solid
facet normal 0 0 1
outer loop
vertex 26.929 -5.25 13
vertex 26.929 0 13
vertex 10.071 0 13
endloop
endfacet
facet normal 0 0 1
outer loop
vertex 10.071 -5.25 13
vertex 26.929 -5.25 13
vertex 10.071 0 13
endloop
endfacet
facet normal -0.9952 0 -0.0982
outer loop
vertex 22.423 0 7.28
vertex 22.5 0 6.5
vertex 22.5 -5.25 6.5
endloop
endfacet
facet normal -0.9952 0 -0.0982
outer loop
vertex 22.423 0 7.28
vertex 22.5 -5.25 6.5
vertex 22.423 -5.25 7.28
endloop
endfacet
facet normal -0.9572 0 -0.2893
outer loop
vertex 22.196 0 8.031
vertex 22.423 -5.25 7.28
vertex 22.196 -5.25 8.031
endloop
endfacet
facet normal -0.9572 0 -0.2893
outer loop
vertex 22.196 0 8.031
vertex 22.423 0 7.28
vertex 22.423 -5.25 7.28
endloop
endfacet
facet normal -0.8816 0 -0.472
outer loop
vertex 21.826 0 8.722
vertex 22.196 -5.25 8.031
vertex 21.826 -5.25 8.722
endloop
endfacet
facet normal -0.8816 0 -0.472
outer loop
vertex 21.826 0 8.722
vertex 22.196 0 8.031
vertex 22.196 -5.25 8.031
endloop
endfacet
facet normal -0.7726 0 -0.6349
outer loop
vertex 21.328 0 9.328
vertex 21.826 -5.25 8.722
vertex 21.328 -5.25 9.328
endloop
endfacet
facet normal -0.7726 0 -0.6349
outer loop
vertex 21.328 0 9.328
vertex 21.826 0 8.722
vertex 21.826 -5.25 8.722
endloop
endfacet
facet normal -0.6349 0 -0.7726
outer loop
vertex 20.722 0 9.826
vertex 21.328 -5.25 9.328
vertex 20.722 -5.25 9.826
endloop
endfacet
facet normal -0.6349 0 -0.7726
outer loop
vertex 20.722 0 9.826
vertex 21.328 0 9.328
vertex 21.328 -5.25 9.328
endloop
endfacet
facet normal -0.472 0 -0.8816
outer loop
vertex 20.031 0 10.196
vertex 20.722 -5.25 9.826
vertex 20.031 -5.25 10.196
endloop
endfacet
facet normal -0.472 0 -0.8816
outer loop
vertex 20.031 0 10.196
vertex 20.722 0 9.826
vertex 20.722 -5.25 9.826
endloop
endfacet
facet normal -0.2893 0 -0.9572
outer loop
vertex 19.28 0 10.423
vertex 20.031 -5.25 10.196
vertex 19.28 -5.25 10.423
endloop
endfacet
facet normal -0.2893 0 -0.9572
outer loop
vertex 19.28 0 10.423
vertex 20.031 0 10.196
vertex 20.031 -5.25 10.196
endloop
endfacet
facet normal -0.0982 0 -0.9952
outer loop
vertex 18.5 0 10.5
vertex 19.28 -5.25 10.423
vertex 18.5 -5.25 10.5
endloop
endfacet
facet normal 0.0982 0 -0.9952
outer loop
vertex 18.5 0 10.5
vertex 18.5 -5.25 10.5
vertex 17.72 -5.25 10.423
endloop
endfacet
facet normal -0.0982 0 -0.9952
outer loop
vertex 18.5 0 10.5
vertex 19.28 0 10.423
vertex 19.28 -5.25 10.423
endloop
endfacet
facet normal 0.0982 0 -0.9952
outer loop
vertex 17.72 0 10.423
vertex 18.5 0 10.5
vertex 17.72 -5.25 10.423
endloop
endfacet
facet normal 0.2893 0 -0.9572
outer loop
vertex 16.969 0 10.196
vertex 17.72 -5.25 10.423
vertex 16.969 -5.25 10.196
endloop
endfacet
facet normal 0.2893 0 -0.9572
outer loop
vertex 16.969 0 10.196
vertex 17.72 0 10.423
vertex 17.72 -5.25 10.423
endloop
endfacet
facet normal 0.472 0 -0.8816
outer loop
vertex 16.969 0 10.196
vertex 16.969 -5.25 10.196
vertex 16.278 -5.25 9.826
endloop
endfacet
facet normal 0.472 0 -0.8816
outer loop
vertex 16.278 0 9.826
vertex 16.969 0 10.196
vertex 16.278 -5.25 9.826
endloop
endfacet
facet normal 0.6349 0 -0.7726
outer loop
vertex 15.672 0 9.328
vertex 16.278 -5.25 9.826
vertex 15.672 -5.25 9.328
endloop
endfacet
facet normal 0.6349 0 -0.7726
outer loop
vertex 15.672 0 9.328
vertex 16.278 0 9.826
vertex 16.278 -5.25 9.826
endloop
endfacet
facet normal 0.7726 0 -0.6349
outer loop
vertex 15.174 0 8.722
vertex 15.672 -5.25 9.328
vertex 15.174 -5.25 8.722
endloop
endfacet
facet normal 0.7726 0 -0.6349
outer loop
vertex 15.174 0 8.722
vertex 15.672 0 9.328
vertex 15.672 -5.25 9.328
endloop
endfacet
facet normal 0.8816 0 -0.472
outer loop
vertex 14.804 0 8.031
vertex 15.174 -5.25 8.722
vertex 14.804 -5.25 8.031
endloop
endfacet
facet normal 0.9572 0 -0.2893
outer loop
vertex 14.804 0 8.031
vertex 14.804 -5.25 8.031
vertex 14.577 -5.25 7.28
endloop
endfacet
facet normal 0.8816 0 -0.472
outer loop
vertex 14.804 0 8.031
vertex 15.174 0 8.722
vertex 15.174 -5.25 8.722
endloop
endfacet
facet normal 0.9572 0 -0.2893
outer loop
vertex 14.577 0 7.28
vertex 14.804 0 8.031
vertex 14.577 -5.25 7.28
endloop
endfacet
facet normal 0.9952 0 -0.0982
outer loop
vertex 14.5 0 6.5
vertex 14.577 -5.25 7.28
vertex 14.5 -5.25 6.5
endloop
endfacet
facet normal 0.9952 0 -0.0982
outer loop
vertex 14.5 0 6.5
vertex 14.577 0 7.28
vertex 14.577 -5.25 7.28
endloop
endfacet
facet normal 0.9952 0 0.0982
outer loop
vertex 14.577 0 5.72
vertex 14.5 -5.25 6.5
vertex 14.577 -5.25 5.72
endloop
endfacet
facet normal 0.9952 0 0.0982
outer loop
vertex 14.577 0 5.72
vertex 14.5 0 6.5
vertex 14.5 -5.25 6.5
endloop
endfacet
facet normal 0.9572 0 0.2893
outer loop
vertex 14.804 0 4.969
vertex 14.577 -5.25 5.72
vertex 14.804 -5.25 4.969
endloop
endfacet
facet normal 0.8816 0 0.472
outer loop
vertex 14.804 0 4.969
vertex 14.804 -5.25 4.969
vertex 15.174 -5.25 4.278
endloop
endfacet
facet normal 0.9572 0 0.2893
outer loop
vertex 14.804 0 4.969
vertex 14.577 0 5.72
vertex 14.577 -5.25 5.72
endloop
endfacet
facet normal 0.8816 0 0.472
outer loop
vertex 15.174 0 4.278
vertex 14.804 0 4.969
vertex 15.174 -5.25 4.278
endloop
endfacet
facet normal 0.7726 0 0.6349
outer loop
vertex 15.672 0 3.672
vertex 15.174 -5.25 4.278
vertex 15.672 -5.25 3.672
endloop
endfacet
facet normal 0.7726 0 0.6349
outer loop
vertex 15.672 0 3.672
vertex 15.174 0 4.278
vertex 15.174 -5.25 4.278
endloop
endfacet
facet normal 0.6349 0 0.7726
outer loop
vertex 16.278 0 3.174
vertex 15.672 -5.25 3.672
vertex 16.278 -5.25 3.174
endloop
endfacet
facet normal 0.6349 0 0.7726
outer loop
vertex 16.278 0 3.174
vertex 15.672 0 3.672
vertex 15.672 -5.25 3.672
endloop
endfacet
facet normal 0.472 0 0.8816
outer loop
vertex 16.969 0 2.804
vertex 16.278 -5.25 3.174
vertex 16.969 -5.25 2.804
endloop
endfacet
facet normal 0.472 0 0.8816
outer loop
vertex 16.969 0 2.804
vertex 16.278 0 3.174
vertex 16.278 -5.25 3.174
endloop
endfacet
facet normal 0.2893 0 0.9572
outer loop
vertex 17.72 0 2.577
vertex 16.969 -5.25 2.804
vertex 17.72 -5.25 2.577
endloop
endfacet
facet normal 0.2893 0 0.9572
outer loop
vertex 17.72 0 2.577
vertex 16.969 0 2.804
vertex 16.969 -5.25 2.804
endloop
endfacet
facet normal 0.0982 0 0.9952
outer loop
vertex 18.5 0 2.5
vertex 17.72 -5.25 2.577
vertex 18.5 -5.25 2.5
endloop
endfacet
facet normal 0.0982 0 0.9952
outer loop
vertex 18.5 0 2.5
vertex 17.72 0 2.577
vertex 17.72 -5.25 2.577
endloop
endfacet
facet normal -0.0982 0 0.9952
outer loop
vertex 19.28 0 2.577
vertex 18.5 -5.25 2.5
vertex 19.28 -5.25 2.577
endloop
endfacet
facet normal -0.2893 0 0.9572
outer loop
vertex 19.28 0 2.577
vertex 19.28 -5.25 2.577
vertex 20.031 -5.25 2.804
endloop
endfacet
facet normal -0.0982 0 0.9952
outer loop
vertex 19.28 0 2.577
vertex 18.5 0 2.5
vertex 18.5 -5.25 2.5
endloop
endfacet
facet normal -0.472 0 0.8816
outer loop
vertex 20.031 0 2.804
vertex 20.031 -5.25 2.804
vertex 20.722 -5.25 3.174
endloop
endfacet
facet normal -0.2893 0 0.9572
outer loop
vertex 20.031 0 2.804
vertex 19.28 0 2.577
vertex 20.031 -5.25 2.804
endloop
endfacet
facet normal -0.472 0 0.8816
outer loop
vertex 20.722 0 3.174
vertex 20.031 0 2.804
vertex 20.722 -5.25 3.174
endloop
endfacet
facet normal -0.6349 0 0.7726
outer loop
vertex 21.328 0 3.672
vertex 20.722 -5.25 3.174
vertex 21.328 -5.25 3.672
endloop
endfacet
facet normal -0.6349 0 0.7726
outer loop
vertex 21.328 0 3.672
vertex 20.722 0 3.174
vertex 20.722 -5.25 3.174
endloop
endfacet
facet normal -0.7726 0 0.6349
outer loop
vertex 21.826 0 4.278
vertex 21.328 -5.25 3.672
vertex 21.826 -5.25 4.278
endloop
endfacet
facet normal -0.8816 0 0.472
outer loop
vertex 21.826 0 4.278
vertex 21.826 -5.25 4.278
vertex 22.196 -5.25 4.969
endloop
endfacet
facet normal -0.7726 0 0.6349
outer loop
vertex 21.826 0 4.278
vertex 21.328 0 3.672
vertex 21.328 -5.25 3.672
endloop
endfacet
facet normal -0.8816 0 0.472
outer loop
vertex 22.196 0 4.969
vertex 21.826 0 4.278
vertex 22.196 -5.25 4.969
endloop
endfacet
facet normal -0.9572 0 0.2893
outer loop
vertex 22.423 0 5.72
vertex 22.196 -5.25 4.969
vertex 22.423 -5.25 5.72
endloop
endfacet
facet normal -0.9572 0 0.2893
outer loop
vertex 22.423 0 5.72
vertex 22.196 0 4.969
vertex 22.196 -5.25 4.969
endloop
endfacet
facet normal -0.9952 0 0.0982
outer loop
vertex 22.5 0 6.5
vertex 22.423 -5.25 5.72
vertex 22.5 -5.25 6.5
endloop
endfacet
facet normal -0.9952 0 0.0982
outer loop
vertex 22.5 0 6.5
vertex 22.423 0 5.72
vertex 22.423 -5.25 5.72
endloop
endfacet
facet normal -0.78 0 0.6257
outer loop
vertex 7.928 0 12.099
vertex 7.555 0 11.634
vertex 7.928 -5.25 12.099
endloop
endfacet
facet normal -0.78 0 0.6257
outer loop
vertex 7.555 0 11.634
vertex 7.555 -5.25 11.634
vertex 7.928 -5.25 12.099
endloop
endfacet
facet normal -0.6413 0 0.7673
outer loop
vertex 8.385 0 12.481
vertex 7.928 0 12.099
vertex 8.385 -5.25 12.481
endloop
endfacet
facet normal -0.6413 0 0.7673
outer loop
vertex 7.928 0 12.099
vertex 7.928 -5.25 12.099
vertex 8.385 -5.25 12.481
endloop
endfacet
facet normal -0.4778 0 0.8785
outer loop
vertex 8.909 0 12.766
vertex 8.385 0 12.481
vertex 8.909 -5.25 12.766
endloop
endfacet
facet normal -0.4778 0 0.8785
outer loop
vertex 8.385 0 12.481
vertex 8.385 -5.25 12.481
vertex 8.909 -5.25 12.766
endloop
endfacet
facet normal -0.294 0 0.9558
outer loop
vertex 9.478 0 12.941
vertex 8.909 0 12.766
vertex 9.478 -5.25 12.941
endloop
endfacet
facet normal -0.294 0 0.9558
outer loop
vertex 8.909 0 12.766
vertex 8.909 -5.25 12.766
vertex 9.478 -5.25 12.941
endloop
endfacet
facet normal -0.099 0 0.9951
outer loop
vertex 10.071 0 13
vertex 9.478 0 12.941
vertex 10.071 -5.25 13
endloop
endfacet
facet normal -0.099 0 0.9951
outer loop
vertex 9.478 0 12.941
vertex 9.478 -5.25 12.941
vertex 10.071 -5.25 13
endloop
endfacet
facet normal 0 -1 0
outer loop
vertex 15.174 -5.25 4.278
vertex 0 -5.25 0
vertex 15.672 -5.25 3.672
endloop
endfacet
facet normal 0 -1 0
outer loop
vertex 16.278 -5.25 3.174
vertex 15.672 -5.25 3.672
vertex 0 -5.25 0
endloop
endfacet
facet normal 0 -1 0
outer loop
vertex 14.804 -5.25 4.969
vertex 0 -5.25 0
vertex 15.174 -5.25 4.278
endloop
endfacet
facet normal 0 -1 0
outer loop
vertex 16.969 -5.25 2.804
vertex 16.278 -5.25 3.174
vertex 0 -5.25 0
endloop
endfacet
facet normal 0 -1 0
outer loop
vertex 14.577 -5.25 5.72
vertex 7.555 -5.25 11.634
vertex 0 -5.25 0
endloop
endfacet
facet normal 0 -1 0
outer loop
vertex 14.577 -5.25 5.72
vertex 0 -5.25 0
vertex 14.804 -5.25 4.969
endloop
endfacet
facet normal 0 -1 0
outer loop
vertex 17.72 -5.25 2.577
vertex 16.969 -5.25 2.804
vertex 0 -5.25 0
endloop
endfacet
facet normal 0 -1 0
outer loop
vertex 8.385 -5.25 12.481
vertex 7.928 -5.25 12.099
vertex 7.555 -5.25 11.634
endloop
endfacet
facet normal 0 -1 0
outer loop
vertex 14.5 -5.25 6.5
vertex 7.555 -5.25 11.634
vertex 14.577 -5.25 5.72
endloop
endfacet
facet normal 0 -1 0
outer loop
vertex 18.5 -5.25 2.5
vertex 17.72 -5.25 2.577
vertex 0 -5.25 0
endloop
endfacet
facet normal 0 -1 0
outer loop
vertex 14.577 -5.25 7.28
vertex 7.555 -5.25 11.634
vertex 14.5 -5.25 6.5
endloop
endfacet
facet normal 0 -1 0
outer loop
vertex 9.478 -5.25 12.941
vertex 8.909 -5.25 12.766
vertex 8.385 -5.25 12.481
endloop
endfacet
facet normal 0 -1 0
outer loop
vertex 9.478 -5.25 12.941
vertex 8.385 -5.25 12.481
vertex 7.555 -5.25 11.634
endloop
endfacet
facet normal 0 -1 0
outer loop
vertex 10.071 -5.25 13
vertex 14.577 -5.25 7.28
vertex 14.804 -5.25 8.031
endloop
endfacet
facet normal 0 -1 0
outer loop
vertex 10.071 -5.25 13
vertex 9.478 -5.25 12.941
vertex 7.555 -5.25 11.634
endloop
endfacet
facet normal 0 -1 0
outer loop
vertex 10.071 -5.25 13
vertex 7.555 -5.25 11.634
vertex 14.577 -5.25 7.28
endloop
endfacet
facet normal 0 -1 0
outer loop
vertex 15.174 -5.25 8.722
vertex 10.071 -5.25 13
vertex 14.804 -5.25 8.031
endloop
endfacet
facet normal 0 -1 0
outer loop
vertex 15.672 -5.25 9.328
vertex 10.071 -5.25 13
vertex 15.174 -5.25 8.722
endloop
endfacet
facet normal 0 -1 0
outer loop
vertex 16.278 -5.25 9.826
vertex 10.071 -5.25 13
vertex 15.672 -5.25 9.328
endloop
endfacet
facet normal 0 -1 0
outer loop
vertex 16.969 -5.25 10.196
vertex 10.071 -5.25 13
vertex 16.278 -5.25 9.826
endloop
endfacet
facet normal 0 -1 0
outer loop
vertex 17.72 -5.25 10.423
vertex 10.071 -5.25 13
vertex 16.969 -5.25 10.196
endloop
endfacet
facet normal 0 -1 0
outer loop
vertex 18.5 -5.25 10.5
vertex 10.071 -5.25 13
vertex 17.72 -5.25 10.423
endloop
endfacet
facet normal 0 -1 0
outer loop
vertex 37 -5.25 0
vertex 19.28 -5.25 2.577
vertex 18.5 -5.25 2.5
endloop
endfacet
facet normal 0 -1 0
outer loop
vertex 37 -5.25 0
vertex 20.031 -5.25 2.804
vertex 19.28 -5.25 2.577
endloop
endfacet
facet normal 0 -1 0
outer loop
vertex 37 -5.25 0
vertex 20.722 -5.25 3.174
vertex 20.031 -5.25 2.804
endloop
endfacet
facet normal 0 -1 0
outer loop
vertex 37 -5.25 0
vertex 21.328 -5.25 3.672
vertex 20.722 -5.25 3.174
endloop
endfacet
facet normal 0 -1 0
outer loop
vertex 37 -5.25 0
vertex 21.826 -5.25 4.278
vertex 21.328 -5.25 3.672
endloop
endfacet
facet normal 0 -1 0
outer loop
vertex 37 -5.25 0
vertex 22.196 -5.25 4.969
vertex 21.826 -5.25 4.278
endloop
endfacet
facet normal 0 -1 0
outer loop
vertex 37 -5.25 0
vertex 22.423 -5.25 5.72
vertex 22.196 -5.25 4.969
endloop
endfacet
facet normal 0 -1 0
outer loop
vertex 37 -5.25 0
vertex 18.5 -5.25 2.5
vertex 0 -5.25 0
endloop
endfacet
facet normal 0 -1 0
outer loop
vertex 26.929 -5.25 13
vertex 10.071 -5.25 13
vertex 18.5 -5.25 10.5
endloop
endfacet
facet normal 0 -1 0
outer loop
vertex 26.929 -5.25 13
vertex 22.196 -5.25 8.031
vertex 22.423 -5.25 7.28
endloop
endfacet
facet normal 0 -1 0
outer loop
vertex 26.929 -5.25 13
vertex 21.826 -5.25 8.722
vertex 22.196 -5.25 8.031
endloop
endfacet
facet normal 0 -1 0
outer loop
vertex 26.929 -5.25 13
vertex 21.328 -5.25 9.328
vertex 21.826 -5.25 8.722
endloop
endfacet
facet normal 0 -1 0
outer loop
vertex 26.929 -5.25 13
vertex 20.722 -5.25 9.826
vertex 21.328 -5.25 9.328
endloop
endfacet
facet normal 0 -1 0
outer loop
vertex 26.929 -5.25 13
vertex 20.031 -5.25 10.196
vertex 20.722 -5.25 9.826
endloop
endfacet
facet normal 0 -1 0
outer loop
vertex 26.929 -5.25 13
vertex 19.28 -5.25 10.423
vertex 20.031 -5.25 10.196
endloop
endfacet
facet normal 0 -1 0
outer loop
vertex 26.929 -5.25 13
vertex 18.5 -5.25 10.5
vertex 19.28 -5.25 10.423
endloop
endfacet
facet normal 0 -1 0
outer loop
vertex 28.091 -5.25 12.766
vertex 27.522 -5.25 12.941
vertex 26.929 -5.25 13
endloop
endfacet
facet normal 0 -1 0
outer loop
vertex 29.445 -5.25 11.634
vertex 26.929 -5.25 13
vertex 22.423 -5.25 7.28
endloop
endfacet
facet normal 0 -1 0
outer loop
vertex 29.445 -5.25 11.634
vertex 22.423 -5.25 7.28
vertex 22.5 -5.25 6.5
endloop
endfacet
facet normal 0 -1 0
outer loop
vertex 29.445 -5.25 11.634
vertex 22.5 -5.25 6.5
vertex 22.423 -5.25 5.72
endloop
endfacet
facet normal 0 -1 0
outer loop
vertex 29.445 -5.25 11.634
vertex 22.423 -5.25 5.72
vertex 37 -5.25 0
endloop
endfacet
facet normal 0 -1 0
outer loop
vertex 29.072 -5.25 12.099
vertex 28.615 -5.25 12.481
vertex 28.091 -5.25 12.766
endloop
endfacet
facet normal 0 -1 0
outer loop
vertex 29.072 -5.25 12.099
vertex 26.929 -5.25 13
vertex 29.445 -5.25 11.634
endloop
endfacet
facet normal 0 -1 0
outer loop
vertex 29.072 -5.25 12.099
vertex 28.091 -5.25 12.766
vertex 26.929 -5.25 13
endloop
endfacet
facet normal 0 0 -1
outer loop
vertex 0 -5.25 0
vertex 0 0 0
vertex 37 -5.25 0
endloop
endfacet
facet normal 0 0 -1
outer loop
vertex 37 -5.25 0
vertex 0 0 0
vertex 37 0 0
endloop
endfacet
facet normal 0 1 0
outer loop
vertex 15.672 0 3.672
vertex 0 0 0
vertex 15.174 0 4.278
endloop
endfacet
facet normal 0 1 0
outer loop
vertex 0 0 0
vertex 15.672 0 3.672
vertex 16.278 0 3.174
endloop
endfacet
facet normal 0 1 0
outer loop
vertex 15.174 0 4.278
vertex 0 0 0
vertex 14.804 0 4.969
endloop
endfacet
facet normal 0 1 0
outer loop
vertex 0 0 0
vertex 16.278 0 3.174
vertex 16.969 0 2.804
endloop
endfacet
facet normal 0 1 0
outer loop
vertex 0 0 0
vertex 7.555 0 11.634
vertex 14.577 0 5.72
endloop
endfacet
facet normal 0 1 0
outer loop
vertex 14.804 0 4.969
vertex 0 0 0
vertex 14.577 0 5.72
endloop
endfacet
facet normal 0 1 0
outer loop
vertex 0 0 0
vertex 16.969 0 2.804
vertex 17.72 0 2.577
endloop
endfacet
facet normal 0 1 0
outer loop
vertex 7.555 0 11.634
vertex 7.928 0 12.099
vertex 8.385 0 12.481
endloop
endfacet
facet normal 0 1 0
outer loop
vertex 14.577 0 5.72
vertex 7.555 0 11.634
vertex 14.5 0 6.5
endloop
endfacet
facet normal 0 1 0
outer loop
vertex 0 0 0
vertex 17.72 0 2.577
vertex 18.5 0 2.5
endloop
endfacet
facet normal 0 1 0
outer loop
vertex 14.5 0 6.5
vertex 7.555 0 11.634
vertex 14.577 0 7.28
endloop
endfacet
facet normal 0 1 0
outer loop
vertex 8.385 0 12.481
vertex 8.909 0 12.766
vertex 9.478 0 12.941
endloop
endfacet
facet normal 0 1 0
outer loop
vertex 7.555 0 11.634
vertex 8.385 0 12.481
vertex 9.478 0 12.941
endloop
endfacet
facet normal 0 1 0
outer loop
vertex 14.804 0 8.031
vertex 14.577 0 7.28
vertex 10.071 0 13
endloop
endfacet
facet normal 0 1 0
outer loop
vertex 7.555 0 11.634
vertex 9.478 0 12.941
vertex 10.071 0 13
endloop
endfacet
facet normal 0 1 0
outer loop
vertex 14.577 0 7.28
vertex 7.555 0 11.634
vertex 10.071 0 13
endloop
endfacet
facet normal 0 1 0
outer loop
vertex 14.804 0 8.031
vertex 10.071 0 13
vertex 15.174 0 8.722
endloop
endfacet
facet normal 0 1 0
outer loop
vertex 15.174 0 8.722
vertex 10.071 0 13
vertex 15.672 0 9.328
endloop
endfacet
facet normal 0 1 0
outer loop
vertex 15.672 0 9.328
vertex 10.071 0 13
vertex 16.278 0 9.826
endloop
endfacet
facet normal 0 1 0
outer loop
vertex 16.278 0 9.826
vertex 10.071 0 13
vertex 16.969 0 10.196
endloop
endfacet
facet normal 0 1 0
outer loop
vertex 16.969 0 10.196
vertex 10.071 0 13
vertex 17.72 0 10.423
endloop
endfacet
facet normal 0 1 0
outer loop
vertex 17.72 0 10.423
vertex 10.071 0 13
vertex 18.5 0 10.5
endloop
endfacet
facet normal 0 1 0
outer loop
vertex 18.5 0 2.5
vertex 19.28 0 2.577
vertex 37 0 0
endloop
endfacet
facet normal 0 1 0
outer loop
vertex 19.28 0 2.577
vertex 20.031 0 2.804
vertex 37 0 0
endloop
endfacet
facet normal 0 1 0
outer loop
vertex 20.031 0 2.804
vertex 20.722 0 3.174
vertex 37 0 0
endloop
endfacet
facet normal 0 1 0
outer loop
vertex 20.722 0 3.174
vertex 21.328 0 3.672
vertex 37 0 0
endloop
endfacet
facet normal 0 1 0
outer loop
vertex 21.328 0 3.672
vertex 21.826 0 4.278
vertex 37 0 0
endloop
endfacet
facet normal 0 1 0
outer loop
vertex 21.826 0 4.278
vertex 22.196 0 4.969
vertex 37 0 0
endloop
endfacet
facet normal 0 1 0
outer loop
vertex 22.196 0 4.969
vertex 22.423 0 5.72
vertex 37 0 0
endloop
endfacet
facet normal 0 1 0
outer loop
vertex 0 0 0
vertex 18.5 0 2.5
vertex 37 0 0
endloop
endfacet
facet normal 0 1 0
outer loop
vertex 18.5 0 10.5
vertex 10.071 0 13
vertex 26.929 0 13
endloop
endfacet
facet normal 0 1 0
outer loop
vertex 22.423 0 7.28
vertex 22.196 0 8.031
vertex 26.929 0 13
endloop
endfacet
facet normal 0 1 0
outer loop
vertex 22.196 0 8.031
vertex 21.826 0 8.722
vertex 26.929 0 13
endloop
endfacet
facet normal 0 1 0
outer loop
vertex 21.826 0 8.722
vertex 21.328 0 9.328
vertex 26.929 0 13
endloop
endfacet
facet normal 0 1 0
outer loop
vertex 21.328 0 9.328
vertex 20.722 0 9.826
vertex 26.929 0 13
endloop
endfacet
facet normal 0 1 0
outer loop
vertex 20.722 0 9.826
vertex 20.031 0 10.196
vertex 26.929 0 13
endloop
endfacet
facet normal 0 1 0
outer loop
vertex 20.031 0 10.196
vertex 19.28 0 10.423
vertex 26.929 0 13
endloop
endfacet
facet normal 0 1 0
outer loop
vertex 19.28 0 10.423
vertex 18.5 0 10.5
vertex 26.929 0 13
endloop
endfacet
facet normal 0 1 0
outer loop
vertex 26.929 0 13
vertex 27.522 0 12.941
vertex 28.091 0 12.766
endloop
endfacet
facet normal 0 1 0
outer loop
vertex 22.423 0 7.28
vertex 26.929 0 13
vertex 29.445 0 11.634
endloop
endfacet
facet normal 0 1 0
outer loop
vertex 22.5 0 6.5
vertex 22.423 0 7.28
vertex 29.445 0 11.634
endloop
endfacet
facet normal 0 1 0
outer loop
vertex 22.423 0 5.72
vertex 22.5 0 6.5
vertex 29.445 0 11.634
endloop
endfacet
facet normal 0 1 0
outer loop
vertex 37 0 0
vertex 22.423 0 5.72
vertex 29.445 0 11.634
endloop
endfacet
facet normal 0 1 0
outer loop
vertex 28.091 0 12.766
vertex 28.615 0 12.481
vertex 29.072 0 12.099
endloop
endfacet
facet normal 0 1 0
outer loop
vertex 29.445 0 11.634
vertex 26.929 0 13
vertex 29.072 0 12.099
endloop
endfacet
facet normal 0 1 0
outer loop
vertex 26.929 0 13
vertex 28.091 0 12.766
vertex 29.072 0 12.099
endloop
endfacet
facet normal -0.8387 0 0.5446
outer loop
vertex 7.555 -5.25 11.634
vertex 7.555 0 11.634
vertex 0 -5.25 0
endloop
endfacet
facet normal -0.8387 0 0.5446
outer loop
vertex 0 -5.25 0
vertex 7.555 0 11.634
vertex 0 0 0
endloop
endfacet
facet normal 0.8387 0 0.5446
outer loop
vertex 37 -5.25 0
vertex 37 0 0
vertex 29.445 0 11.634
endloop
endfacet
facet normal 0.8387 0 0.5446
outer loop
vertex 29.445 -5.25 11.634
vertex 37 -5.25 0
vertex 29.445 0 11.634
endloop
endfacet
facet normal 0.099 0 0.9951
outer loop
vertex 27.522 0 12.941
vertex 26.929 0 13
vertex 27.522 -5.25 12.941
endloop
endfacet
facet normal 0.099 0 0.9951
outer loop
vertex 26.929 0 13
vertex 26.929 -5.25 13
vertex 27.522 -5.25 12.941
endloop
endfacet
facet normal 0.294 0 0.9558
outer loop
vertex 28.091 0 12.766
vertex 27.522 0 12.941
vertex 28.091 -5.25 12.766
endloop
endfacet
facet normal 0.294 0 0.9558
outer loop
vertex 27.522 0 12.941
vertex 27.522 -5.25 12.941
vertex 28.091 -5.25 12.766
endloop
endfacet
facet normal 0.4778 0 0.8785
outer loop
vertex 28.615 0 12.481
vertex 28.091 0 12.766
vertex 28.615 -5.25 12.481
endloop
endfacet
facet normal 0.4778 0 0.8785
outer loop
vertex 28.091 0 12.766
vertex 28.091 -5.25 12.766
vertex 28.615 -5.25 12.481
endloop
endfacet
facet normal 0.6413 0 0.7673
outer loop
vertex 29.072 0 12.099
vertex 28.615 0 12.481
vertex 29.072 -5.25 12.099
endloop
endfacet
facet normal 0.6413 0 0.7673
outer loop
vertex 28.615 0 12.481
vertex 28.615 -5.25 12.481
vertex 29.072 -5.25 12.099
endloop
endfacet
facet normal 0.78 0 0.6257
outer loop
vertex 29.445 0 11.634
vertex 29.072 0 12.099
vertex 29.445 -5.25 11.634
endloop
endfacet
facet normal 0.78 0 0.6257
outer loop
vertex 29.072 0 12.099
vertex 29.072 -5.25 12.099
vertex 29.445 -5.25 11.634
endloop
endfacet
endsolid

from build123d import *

# Parameters (mm, degrees)
F0_R     = 4
F1_DEPTH = 5.25
F2_R     = 3


with BuildPart() as f1:
    # F0 (on Front) → F1 (new body)
    with BuildSketch(Plane.XZ):
        Polygon((8.442299, 13), (0, 0), (37, 0), (28.557701, 13), align=None)
        with Locations((18.5, 6.5)):
            Circle(F0_R, mode=Mode.SUBTRACT)
    extrude(amount=F1_DEPTH)

    # F2
    f2_edges = [f1.edges().sort_by_distance(p)[0] for p in [
        (8.442299, -2.625, 13),
        (28.557701, -2.625, 13),
    ]]
    fillet(f2_edges, radius=F2_R)


solid = f1.part
